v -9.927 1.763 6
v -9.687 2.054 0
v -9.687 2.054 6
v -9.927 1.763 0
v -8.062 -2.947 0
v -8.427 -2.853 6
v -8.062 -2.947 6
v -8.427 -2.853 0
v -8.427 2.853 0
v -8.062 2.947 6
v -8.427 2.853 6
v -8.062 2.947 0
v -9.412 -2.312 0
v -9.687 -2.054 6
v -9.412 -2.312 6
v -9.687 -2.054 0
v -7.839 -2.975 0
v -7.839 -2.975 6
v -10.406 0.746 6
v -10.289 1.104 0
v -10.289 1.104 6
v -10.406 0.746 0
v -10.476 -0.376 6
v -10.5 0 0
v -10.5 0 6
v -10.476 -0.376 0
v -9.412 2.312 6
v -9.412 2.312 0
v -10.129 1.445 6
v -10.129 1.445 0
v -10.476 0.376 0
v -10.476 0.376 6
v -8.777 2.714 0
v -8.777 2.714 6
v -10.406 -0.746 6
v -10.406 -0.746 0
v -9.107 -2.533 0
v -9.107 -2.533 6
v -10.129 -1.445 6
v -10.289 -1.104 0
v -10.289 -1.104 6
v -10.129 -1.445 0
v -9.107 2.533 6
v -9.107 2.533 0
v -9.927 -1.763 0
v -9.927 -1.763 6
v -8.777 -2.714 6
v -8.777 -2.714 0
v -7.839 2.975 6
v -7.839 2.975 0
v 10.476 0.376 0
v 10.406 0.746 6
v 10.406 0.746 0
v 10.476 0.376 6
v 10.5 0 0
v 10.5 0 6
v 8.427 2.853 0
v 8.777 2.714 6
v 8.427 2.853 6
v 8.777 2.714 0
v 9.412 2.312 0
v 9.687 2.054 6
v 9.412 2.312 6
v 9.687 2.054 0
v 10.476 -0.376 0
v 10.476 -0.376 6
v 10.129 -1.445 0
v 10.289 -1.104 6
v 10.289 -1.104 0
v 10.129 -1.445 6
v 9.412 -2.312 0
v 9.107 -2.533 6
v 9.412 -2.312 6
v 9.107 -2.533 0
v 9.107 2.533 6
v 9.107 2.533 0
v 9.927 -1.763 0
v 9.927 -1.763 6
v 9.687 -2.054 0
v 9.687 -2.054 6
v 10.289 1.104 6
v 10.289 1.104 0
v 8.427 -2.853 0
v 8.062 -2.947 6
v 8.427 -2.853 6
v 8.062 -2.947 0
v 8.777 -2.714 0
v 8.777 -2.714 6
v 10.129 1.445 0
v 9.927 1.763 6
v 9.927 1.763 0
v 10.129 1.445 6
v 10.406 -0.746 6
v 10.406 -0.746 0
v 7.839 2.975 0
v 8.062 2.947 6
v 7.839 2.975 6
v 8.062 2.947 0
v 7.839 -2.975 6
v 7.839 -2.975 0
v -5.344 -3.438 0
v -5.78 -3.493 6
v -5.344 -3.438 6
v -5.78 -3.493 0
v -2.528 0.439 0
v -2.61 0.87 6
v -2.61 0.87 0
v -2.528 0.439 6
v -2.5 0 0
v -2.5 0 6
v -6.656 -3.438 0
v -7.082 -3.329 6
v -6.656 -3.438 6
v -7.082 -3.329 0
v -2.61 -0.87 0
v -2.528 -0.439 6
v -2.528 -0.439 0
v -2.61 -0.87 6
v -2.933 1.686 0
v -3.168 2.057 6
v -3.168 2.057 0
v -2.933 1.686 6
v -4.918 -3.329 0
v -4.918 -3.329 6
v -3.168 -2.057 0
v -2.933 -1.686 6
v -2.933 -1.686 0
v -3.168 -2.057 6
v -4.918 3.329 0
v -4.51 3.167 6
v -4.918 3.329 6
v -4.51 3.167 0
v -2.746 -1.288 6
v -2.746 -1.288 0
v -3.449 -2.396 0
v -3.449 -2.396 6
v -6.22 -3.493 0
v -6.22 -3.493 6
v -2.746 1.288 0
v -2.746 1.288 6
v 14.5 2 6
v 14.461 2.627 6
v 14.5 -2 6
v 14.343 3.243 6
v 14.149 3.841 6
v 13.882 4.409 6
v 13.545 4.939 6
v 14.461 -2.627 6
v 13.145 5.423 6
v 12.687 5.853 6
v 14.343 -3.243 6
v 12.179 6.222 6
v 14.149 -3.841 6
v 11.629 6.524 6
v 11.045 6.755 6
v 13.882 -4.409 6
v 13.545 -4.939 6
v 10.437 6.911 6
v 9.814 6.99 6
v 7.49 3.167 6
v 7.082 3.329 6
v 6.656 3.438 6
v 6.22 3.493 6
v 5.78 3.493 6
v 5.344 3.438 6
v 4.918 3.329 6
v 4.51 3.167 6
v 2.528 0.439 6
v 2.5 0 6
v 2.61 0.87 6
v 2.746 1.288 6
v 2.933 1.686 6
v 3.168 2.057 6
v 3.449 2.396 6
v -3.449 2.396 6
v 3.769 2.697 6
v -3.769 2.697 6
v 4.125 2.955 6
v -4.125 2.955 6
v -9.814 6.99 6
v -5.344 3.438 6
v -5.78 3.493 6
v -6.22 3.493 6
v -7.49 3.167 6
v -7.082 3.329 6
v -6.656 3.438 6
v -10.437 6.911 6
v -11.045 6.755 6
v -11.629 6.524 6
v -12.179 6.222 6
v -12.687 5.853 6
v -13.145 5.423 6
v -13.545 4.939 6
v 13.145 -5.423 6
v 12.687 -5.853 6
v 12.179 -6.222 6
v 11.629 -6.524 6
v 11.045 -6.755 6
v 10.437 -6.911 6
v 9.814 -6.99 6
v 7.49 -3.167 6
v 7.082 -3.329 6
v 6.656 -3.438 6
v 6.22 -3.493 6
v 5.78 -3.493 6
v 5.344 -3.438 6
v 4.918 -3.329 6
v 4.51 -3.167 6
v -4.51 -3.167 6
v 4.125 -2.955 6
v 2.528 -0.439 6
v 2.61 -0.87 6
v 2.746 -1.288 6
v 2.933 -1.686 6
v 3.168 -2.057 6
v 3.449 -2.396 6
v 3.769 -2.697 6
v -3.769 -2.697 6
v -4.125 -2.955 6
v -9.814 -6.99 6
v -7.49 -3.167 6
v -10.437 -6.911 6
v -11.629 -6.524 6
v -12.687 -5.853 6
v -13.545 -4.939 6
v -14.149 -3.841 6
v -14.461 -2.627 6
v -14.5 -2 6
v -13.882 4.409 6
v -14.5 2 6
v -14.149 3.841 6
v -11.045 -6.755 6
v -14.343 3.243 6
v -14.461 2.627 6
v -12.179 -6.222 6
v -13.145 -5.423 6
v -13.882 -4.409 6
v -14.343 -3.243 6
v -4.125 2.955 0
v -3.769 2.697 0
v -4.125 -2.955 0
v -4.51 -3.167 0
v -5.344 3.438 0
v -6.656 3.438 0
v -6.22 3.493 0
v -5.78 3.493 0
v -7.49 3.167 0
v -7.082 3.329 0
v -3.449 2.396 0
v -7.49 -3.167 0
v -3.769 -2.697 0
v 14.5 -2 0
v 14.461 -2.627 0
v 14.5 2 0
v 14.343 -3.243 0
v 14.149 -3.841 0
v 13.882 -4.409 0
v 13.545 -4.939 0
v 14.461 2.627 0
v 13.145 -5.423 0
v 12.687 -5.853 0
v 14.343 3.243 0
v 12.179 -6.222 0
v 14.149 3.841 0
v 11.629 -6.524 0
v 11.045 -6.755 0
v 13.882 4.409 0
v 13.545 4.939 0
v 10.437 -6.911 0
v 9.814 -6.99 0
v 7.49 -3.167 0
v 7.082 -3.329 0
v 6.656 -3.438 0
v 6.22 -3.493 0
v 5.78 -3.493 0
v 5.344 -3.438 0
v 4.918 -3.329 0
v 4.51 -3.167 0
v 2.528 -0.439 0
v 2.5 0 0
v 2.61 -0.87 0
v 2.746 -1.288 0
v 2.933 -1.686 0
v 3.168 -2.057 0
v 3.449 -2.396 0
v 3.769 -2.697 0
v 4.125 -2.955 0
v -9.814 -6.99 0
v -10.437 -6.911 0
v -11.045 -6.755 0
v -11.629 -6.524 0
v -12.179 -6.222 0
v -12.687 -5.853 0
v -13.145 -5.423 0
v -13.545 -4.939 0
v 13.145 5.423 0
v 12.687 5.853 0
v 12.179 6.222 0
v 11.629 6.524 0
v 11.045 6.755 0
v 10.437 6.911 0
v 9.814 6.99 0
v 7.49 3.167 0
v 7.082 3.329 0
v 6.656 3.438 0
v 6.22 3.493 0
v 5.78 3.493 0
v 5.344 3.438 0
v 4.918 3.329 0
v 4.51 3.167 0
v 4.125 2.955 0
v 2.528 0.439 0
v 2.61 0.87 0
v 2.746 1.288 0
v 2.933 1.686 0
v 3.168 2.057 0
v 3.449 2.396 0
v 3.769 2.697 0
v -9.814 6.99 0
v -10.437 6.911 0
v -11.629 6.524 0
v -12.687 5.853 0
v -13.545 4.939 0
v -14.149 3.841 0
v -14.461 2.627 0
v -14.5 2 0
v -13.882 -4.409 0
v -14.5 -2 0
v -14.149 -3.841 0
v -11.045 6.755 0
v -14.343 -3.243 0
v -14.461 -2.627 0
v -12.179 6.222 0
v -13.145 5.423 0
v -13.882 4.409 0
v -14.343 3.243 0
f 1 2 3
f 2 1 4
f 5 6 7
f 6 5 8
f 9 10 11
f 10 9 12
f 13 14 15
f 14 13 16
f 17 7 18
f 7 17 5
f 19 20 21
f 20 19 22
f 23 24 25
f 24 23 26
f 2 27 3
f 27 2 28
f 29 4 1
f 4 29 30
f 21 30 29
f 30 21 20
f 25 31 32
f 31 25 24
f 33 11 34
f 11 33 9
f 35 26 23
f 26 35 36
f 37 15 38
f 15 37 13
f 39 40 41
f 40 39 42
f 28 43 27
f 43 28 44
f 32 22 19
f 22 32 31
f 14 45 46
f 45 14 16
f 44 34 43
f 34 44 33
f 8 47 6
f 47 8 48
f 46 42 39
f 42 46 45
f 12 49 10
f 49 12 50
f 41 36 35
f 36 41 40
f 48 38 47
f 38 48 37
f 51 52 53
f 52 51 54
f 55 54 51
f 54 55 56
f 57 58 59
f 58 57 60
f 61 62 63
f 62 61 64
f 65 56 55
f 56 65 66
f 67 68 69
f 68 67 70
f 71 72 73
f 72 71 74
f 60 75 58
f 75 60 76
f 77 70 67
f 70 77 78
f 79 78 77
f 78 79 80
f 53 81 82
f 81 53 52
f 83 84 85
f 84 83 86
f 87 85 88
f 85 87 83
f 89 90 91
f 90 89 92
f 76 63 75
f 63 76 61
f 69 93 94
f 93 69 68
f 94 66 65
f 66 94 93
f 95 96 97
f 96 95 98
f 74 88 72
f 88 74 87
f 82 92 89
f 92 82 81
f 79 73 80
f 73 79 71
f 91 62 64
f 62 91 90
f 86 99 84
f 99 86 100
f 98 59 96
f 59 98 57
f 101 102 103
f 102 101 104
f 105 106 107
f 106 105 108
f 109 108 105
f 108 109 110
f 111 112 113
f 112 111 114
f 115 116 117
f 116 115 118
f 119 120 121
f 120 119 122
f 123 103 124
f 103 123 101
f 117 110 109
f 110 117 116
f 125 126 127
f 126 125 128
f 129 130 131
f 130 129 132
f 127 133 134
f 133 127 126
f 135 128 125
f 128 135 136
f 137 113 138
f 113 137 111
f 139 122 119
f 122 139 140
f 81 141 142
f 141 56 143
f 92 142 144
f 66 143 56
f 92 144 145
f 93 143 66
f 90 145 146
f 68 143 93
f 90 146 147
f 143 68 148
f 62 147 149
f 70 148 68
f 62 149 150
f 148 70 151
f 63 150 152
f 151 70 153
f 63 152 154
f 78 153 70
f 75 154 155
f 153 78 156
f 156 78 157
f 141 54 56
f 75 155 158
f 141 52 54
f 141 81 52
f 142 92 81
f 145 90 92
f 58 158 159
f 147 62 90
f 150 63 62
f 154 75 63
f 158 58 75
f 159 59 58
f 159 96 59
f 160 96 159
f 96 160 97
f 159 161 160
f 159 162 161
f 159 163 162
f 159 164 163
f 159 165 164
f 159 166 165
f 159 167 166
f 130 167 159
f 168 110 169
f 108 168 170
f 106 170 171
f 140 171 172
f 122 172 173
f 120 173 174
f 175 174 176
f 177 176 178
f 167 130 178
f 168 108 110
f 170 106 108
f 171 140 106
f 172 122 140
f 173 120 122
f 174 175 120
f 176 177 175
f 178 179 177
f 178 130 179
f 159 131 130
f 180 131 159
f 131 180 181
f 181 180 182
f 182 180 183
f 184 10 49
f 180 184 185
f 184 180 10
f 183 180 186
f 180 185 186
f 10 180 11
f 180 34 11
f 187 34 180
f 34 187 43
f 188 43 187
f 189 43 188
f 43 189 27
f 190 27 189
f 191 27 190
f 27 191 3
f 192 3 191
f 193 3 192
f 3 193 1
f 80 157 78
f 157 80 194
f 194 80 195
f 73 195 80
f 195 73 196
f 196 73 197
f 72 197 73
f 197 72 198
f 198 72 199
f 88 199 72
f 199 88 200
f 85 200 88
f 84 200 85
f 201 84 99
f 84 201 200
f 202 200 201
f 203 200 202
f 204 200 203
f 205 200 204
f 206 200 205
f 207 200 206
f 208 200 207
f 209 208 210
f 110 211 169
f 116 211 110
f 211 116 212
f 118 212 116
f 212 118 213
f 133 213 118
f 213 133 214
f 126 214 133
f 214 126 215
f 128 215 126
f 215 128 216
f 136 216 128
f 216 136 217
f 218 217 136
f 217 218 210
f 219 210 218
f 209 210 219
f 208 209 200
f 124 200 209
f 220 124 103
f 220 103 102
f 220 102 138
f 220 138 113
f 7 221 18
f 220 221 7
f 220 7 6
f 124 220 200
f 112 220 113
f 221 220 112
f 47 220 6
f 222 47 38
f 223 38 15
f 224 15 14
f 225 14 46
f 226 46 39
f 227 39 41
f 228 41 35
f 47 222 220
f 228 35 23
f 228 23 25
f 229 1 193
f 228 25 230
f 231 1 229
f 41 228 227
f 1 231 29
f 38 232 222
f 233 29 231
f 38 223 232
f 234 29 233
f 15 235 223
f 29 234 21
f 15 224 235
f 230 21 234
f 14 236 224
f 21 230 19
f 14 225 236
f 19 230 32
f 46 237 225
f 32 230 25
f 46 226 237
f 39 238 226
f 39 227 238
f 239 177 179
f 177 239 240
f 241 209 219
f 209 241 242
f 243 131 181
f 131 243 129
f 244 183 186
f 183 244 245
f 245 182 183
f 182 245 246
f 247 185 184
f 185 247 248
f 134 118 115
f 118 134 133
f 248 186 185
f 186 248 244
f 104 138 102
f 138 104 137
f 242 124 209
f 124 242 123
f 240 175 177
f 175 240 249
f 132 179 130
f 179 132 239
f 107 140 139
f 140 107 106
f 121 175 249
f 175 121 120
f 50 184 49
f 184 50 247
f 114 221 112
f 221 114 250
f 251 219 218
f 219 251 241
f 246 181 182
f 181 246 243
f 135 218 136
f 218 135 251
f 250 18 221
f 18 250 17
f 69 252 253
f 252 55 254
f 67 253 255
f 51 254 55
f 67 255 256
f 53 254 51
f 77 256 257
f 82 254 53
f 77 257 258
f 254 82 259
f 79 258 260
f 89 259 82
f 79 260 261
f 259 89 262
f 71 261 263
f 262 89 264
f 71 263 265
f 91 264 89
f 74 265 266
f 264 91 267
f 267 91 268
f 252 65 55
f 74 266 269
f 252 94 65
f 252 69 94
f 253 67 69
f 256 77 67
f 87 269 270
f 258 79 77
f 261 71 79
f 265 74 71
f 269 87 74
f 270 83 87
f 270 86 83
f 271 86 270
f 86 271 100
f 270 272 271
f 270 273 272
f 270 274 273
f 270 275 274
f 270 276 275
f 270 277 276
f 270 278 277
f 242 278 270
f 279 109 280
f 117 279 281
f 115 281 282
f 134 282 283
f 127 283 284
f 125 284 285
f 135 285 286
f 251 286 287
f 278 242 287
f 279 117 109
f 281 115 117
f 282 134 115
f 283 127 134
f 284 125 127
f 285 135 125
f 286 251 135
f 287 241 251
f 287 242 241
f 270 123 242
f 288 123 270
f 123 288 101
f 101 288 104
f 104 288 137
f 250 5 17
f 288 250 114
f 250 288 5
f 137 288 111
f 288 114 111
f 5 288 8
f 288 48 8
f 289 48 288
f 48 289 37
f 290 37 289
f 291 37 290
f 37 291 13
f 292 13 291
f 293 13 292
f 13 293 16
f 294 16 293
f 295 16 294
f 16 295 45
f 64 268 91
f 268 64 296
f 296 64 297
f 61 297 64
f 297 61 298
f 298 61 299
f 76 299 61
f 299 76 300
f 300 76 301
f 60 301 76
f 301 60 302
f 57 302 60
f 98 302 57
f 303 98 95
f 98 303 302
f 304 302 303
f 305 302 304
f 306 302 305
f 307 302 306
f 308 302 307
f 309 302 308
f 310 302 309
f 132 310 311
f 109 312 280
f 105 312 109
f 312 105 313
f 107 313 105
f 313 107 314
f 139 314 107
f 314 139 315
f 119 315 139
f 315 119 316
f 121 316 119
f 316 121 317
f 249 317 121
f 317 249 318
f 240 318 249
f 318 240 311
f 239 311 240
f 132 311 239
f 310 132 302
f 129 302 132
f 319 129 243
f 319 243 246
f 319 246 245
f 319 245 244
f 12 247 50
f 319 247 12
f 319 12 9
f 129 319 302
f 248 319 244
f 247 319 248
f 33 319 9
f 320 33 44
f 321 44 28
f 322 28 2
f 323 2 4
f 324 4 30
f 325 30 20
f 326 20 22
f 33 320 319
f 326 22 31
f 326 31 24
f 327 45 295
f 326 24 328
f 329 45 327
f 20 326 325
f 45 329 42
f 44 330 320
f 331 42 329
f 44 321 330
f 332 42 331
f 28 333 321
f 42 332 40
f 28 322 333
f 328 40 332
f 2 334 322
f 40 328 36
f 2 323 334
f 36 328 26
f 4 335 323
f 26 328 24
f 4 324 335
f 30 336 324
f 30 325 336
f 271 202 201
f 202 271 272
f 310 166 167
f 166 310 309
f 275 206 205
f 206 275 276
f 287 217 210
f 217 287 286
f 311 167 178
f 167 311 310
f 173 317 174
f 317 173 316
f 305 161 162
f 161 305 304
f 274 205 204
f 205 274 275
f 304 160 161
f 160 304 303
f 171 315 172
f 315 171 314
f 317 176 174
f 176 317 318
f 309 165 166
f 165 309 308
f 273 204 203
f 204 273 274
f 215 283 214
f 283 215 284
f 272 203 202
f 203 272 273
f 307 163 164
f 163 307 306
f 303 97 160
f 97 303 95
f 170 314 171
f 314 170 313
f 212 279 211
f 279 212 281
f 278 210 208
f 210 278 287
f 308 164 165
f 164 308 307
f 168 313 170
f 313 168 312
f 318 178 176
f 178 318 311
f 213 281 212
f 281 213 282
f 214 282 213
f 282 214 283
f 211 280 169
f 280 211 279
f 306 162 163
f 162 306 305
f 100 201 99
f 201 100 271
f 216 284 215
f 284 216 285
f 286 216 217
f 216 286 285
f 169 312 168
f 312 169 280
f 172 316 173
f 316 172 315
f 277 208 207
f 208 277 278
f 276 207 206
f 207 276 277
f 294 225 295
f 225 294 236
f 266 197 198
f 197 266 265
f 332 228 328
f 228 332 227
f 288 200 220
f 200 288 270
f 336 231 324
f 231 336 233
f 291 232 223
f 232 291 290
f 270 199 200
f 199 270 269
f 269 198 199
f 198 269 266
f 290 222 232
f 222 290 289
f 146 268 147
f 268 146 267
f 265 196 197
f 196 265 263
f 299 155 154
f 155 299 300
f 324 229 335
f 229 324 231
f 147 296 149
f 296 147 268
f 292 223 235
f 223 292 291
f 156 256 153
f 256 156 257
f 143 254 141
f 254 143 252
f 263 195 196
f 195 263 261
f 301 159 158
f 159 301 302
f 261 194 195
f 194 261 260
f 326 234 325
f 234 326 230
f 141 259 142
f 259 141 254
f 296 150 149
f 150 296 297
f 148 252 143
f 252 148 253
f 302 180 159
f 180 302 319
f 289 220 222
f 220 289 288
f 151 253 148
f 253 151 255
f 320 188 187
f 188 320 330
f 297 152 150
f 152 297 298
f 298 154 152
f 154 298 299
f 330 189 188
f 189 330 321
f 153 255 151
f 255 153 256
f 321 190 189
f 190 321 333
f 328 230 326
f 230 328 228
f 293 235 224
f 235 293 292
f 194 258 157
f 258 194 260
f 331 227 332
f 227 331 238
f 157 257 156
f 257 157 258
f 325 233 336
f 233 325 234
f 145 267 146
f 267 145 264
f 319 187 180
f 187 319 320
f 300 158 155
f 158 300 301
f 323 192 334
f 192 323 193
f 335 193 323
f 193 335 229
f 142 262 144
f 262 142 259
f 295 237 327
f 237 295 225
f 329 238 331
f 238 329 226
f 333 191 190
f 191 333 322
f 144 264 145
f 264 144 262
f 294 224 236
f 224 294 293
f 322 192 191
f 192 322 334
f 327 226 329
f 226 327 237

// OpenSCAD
$fn = 50;


difference() {
	union() {
		hull() {
			translate(v = [-9.5000000000, 2.0000000000, 0]) {
				cylinder(h = 6, r = 5);
			}
			translate(v = [9.5000000000, 2.0000000000, 0]) {
				cylinder(h = 6, r = 5);
			}
			translate(v = [-9.5000000000, -2.0000000000, 0]) {
				cylinder(h = 6, r = 5);
			}
			translate(v = [9.5000000000, -2.0000000000, 0]) {
				cylinder(h = 6, r = 5);
			}
		}
	}
	union() {
		#translate(v = [-7.5000000000, 0.0000000000, -100.0000000000]) {
			cylinder(h = 200, r = 3.0000000000);
		}
		#translate(v = [-7.5000000000, 0.0000000000, -100.0000000000]) {
			cylinder(h = 200, r = 3.0000000000);
		}
		#translate(v = [7.5000000000, 0.0000000000, -100.0000000000]) {
			cylinder(h = 200, r = 3.0000000000);
		}
		#translate(v = [7.5000000000, 0.0000000000, -100.0000000000]) {
			cylinder(h = 200, r = 3.0000000000);
		}
		#translate(v = [-6.0000000000, 0, 0]) {
			cylinder(h = 6, r = 3.5000000000);
		}
		#translate(v = [6.0000000000, 0, 0]) {
			cylinder(h = 6, r = 3.5000000000);
		}
	}
}
